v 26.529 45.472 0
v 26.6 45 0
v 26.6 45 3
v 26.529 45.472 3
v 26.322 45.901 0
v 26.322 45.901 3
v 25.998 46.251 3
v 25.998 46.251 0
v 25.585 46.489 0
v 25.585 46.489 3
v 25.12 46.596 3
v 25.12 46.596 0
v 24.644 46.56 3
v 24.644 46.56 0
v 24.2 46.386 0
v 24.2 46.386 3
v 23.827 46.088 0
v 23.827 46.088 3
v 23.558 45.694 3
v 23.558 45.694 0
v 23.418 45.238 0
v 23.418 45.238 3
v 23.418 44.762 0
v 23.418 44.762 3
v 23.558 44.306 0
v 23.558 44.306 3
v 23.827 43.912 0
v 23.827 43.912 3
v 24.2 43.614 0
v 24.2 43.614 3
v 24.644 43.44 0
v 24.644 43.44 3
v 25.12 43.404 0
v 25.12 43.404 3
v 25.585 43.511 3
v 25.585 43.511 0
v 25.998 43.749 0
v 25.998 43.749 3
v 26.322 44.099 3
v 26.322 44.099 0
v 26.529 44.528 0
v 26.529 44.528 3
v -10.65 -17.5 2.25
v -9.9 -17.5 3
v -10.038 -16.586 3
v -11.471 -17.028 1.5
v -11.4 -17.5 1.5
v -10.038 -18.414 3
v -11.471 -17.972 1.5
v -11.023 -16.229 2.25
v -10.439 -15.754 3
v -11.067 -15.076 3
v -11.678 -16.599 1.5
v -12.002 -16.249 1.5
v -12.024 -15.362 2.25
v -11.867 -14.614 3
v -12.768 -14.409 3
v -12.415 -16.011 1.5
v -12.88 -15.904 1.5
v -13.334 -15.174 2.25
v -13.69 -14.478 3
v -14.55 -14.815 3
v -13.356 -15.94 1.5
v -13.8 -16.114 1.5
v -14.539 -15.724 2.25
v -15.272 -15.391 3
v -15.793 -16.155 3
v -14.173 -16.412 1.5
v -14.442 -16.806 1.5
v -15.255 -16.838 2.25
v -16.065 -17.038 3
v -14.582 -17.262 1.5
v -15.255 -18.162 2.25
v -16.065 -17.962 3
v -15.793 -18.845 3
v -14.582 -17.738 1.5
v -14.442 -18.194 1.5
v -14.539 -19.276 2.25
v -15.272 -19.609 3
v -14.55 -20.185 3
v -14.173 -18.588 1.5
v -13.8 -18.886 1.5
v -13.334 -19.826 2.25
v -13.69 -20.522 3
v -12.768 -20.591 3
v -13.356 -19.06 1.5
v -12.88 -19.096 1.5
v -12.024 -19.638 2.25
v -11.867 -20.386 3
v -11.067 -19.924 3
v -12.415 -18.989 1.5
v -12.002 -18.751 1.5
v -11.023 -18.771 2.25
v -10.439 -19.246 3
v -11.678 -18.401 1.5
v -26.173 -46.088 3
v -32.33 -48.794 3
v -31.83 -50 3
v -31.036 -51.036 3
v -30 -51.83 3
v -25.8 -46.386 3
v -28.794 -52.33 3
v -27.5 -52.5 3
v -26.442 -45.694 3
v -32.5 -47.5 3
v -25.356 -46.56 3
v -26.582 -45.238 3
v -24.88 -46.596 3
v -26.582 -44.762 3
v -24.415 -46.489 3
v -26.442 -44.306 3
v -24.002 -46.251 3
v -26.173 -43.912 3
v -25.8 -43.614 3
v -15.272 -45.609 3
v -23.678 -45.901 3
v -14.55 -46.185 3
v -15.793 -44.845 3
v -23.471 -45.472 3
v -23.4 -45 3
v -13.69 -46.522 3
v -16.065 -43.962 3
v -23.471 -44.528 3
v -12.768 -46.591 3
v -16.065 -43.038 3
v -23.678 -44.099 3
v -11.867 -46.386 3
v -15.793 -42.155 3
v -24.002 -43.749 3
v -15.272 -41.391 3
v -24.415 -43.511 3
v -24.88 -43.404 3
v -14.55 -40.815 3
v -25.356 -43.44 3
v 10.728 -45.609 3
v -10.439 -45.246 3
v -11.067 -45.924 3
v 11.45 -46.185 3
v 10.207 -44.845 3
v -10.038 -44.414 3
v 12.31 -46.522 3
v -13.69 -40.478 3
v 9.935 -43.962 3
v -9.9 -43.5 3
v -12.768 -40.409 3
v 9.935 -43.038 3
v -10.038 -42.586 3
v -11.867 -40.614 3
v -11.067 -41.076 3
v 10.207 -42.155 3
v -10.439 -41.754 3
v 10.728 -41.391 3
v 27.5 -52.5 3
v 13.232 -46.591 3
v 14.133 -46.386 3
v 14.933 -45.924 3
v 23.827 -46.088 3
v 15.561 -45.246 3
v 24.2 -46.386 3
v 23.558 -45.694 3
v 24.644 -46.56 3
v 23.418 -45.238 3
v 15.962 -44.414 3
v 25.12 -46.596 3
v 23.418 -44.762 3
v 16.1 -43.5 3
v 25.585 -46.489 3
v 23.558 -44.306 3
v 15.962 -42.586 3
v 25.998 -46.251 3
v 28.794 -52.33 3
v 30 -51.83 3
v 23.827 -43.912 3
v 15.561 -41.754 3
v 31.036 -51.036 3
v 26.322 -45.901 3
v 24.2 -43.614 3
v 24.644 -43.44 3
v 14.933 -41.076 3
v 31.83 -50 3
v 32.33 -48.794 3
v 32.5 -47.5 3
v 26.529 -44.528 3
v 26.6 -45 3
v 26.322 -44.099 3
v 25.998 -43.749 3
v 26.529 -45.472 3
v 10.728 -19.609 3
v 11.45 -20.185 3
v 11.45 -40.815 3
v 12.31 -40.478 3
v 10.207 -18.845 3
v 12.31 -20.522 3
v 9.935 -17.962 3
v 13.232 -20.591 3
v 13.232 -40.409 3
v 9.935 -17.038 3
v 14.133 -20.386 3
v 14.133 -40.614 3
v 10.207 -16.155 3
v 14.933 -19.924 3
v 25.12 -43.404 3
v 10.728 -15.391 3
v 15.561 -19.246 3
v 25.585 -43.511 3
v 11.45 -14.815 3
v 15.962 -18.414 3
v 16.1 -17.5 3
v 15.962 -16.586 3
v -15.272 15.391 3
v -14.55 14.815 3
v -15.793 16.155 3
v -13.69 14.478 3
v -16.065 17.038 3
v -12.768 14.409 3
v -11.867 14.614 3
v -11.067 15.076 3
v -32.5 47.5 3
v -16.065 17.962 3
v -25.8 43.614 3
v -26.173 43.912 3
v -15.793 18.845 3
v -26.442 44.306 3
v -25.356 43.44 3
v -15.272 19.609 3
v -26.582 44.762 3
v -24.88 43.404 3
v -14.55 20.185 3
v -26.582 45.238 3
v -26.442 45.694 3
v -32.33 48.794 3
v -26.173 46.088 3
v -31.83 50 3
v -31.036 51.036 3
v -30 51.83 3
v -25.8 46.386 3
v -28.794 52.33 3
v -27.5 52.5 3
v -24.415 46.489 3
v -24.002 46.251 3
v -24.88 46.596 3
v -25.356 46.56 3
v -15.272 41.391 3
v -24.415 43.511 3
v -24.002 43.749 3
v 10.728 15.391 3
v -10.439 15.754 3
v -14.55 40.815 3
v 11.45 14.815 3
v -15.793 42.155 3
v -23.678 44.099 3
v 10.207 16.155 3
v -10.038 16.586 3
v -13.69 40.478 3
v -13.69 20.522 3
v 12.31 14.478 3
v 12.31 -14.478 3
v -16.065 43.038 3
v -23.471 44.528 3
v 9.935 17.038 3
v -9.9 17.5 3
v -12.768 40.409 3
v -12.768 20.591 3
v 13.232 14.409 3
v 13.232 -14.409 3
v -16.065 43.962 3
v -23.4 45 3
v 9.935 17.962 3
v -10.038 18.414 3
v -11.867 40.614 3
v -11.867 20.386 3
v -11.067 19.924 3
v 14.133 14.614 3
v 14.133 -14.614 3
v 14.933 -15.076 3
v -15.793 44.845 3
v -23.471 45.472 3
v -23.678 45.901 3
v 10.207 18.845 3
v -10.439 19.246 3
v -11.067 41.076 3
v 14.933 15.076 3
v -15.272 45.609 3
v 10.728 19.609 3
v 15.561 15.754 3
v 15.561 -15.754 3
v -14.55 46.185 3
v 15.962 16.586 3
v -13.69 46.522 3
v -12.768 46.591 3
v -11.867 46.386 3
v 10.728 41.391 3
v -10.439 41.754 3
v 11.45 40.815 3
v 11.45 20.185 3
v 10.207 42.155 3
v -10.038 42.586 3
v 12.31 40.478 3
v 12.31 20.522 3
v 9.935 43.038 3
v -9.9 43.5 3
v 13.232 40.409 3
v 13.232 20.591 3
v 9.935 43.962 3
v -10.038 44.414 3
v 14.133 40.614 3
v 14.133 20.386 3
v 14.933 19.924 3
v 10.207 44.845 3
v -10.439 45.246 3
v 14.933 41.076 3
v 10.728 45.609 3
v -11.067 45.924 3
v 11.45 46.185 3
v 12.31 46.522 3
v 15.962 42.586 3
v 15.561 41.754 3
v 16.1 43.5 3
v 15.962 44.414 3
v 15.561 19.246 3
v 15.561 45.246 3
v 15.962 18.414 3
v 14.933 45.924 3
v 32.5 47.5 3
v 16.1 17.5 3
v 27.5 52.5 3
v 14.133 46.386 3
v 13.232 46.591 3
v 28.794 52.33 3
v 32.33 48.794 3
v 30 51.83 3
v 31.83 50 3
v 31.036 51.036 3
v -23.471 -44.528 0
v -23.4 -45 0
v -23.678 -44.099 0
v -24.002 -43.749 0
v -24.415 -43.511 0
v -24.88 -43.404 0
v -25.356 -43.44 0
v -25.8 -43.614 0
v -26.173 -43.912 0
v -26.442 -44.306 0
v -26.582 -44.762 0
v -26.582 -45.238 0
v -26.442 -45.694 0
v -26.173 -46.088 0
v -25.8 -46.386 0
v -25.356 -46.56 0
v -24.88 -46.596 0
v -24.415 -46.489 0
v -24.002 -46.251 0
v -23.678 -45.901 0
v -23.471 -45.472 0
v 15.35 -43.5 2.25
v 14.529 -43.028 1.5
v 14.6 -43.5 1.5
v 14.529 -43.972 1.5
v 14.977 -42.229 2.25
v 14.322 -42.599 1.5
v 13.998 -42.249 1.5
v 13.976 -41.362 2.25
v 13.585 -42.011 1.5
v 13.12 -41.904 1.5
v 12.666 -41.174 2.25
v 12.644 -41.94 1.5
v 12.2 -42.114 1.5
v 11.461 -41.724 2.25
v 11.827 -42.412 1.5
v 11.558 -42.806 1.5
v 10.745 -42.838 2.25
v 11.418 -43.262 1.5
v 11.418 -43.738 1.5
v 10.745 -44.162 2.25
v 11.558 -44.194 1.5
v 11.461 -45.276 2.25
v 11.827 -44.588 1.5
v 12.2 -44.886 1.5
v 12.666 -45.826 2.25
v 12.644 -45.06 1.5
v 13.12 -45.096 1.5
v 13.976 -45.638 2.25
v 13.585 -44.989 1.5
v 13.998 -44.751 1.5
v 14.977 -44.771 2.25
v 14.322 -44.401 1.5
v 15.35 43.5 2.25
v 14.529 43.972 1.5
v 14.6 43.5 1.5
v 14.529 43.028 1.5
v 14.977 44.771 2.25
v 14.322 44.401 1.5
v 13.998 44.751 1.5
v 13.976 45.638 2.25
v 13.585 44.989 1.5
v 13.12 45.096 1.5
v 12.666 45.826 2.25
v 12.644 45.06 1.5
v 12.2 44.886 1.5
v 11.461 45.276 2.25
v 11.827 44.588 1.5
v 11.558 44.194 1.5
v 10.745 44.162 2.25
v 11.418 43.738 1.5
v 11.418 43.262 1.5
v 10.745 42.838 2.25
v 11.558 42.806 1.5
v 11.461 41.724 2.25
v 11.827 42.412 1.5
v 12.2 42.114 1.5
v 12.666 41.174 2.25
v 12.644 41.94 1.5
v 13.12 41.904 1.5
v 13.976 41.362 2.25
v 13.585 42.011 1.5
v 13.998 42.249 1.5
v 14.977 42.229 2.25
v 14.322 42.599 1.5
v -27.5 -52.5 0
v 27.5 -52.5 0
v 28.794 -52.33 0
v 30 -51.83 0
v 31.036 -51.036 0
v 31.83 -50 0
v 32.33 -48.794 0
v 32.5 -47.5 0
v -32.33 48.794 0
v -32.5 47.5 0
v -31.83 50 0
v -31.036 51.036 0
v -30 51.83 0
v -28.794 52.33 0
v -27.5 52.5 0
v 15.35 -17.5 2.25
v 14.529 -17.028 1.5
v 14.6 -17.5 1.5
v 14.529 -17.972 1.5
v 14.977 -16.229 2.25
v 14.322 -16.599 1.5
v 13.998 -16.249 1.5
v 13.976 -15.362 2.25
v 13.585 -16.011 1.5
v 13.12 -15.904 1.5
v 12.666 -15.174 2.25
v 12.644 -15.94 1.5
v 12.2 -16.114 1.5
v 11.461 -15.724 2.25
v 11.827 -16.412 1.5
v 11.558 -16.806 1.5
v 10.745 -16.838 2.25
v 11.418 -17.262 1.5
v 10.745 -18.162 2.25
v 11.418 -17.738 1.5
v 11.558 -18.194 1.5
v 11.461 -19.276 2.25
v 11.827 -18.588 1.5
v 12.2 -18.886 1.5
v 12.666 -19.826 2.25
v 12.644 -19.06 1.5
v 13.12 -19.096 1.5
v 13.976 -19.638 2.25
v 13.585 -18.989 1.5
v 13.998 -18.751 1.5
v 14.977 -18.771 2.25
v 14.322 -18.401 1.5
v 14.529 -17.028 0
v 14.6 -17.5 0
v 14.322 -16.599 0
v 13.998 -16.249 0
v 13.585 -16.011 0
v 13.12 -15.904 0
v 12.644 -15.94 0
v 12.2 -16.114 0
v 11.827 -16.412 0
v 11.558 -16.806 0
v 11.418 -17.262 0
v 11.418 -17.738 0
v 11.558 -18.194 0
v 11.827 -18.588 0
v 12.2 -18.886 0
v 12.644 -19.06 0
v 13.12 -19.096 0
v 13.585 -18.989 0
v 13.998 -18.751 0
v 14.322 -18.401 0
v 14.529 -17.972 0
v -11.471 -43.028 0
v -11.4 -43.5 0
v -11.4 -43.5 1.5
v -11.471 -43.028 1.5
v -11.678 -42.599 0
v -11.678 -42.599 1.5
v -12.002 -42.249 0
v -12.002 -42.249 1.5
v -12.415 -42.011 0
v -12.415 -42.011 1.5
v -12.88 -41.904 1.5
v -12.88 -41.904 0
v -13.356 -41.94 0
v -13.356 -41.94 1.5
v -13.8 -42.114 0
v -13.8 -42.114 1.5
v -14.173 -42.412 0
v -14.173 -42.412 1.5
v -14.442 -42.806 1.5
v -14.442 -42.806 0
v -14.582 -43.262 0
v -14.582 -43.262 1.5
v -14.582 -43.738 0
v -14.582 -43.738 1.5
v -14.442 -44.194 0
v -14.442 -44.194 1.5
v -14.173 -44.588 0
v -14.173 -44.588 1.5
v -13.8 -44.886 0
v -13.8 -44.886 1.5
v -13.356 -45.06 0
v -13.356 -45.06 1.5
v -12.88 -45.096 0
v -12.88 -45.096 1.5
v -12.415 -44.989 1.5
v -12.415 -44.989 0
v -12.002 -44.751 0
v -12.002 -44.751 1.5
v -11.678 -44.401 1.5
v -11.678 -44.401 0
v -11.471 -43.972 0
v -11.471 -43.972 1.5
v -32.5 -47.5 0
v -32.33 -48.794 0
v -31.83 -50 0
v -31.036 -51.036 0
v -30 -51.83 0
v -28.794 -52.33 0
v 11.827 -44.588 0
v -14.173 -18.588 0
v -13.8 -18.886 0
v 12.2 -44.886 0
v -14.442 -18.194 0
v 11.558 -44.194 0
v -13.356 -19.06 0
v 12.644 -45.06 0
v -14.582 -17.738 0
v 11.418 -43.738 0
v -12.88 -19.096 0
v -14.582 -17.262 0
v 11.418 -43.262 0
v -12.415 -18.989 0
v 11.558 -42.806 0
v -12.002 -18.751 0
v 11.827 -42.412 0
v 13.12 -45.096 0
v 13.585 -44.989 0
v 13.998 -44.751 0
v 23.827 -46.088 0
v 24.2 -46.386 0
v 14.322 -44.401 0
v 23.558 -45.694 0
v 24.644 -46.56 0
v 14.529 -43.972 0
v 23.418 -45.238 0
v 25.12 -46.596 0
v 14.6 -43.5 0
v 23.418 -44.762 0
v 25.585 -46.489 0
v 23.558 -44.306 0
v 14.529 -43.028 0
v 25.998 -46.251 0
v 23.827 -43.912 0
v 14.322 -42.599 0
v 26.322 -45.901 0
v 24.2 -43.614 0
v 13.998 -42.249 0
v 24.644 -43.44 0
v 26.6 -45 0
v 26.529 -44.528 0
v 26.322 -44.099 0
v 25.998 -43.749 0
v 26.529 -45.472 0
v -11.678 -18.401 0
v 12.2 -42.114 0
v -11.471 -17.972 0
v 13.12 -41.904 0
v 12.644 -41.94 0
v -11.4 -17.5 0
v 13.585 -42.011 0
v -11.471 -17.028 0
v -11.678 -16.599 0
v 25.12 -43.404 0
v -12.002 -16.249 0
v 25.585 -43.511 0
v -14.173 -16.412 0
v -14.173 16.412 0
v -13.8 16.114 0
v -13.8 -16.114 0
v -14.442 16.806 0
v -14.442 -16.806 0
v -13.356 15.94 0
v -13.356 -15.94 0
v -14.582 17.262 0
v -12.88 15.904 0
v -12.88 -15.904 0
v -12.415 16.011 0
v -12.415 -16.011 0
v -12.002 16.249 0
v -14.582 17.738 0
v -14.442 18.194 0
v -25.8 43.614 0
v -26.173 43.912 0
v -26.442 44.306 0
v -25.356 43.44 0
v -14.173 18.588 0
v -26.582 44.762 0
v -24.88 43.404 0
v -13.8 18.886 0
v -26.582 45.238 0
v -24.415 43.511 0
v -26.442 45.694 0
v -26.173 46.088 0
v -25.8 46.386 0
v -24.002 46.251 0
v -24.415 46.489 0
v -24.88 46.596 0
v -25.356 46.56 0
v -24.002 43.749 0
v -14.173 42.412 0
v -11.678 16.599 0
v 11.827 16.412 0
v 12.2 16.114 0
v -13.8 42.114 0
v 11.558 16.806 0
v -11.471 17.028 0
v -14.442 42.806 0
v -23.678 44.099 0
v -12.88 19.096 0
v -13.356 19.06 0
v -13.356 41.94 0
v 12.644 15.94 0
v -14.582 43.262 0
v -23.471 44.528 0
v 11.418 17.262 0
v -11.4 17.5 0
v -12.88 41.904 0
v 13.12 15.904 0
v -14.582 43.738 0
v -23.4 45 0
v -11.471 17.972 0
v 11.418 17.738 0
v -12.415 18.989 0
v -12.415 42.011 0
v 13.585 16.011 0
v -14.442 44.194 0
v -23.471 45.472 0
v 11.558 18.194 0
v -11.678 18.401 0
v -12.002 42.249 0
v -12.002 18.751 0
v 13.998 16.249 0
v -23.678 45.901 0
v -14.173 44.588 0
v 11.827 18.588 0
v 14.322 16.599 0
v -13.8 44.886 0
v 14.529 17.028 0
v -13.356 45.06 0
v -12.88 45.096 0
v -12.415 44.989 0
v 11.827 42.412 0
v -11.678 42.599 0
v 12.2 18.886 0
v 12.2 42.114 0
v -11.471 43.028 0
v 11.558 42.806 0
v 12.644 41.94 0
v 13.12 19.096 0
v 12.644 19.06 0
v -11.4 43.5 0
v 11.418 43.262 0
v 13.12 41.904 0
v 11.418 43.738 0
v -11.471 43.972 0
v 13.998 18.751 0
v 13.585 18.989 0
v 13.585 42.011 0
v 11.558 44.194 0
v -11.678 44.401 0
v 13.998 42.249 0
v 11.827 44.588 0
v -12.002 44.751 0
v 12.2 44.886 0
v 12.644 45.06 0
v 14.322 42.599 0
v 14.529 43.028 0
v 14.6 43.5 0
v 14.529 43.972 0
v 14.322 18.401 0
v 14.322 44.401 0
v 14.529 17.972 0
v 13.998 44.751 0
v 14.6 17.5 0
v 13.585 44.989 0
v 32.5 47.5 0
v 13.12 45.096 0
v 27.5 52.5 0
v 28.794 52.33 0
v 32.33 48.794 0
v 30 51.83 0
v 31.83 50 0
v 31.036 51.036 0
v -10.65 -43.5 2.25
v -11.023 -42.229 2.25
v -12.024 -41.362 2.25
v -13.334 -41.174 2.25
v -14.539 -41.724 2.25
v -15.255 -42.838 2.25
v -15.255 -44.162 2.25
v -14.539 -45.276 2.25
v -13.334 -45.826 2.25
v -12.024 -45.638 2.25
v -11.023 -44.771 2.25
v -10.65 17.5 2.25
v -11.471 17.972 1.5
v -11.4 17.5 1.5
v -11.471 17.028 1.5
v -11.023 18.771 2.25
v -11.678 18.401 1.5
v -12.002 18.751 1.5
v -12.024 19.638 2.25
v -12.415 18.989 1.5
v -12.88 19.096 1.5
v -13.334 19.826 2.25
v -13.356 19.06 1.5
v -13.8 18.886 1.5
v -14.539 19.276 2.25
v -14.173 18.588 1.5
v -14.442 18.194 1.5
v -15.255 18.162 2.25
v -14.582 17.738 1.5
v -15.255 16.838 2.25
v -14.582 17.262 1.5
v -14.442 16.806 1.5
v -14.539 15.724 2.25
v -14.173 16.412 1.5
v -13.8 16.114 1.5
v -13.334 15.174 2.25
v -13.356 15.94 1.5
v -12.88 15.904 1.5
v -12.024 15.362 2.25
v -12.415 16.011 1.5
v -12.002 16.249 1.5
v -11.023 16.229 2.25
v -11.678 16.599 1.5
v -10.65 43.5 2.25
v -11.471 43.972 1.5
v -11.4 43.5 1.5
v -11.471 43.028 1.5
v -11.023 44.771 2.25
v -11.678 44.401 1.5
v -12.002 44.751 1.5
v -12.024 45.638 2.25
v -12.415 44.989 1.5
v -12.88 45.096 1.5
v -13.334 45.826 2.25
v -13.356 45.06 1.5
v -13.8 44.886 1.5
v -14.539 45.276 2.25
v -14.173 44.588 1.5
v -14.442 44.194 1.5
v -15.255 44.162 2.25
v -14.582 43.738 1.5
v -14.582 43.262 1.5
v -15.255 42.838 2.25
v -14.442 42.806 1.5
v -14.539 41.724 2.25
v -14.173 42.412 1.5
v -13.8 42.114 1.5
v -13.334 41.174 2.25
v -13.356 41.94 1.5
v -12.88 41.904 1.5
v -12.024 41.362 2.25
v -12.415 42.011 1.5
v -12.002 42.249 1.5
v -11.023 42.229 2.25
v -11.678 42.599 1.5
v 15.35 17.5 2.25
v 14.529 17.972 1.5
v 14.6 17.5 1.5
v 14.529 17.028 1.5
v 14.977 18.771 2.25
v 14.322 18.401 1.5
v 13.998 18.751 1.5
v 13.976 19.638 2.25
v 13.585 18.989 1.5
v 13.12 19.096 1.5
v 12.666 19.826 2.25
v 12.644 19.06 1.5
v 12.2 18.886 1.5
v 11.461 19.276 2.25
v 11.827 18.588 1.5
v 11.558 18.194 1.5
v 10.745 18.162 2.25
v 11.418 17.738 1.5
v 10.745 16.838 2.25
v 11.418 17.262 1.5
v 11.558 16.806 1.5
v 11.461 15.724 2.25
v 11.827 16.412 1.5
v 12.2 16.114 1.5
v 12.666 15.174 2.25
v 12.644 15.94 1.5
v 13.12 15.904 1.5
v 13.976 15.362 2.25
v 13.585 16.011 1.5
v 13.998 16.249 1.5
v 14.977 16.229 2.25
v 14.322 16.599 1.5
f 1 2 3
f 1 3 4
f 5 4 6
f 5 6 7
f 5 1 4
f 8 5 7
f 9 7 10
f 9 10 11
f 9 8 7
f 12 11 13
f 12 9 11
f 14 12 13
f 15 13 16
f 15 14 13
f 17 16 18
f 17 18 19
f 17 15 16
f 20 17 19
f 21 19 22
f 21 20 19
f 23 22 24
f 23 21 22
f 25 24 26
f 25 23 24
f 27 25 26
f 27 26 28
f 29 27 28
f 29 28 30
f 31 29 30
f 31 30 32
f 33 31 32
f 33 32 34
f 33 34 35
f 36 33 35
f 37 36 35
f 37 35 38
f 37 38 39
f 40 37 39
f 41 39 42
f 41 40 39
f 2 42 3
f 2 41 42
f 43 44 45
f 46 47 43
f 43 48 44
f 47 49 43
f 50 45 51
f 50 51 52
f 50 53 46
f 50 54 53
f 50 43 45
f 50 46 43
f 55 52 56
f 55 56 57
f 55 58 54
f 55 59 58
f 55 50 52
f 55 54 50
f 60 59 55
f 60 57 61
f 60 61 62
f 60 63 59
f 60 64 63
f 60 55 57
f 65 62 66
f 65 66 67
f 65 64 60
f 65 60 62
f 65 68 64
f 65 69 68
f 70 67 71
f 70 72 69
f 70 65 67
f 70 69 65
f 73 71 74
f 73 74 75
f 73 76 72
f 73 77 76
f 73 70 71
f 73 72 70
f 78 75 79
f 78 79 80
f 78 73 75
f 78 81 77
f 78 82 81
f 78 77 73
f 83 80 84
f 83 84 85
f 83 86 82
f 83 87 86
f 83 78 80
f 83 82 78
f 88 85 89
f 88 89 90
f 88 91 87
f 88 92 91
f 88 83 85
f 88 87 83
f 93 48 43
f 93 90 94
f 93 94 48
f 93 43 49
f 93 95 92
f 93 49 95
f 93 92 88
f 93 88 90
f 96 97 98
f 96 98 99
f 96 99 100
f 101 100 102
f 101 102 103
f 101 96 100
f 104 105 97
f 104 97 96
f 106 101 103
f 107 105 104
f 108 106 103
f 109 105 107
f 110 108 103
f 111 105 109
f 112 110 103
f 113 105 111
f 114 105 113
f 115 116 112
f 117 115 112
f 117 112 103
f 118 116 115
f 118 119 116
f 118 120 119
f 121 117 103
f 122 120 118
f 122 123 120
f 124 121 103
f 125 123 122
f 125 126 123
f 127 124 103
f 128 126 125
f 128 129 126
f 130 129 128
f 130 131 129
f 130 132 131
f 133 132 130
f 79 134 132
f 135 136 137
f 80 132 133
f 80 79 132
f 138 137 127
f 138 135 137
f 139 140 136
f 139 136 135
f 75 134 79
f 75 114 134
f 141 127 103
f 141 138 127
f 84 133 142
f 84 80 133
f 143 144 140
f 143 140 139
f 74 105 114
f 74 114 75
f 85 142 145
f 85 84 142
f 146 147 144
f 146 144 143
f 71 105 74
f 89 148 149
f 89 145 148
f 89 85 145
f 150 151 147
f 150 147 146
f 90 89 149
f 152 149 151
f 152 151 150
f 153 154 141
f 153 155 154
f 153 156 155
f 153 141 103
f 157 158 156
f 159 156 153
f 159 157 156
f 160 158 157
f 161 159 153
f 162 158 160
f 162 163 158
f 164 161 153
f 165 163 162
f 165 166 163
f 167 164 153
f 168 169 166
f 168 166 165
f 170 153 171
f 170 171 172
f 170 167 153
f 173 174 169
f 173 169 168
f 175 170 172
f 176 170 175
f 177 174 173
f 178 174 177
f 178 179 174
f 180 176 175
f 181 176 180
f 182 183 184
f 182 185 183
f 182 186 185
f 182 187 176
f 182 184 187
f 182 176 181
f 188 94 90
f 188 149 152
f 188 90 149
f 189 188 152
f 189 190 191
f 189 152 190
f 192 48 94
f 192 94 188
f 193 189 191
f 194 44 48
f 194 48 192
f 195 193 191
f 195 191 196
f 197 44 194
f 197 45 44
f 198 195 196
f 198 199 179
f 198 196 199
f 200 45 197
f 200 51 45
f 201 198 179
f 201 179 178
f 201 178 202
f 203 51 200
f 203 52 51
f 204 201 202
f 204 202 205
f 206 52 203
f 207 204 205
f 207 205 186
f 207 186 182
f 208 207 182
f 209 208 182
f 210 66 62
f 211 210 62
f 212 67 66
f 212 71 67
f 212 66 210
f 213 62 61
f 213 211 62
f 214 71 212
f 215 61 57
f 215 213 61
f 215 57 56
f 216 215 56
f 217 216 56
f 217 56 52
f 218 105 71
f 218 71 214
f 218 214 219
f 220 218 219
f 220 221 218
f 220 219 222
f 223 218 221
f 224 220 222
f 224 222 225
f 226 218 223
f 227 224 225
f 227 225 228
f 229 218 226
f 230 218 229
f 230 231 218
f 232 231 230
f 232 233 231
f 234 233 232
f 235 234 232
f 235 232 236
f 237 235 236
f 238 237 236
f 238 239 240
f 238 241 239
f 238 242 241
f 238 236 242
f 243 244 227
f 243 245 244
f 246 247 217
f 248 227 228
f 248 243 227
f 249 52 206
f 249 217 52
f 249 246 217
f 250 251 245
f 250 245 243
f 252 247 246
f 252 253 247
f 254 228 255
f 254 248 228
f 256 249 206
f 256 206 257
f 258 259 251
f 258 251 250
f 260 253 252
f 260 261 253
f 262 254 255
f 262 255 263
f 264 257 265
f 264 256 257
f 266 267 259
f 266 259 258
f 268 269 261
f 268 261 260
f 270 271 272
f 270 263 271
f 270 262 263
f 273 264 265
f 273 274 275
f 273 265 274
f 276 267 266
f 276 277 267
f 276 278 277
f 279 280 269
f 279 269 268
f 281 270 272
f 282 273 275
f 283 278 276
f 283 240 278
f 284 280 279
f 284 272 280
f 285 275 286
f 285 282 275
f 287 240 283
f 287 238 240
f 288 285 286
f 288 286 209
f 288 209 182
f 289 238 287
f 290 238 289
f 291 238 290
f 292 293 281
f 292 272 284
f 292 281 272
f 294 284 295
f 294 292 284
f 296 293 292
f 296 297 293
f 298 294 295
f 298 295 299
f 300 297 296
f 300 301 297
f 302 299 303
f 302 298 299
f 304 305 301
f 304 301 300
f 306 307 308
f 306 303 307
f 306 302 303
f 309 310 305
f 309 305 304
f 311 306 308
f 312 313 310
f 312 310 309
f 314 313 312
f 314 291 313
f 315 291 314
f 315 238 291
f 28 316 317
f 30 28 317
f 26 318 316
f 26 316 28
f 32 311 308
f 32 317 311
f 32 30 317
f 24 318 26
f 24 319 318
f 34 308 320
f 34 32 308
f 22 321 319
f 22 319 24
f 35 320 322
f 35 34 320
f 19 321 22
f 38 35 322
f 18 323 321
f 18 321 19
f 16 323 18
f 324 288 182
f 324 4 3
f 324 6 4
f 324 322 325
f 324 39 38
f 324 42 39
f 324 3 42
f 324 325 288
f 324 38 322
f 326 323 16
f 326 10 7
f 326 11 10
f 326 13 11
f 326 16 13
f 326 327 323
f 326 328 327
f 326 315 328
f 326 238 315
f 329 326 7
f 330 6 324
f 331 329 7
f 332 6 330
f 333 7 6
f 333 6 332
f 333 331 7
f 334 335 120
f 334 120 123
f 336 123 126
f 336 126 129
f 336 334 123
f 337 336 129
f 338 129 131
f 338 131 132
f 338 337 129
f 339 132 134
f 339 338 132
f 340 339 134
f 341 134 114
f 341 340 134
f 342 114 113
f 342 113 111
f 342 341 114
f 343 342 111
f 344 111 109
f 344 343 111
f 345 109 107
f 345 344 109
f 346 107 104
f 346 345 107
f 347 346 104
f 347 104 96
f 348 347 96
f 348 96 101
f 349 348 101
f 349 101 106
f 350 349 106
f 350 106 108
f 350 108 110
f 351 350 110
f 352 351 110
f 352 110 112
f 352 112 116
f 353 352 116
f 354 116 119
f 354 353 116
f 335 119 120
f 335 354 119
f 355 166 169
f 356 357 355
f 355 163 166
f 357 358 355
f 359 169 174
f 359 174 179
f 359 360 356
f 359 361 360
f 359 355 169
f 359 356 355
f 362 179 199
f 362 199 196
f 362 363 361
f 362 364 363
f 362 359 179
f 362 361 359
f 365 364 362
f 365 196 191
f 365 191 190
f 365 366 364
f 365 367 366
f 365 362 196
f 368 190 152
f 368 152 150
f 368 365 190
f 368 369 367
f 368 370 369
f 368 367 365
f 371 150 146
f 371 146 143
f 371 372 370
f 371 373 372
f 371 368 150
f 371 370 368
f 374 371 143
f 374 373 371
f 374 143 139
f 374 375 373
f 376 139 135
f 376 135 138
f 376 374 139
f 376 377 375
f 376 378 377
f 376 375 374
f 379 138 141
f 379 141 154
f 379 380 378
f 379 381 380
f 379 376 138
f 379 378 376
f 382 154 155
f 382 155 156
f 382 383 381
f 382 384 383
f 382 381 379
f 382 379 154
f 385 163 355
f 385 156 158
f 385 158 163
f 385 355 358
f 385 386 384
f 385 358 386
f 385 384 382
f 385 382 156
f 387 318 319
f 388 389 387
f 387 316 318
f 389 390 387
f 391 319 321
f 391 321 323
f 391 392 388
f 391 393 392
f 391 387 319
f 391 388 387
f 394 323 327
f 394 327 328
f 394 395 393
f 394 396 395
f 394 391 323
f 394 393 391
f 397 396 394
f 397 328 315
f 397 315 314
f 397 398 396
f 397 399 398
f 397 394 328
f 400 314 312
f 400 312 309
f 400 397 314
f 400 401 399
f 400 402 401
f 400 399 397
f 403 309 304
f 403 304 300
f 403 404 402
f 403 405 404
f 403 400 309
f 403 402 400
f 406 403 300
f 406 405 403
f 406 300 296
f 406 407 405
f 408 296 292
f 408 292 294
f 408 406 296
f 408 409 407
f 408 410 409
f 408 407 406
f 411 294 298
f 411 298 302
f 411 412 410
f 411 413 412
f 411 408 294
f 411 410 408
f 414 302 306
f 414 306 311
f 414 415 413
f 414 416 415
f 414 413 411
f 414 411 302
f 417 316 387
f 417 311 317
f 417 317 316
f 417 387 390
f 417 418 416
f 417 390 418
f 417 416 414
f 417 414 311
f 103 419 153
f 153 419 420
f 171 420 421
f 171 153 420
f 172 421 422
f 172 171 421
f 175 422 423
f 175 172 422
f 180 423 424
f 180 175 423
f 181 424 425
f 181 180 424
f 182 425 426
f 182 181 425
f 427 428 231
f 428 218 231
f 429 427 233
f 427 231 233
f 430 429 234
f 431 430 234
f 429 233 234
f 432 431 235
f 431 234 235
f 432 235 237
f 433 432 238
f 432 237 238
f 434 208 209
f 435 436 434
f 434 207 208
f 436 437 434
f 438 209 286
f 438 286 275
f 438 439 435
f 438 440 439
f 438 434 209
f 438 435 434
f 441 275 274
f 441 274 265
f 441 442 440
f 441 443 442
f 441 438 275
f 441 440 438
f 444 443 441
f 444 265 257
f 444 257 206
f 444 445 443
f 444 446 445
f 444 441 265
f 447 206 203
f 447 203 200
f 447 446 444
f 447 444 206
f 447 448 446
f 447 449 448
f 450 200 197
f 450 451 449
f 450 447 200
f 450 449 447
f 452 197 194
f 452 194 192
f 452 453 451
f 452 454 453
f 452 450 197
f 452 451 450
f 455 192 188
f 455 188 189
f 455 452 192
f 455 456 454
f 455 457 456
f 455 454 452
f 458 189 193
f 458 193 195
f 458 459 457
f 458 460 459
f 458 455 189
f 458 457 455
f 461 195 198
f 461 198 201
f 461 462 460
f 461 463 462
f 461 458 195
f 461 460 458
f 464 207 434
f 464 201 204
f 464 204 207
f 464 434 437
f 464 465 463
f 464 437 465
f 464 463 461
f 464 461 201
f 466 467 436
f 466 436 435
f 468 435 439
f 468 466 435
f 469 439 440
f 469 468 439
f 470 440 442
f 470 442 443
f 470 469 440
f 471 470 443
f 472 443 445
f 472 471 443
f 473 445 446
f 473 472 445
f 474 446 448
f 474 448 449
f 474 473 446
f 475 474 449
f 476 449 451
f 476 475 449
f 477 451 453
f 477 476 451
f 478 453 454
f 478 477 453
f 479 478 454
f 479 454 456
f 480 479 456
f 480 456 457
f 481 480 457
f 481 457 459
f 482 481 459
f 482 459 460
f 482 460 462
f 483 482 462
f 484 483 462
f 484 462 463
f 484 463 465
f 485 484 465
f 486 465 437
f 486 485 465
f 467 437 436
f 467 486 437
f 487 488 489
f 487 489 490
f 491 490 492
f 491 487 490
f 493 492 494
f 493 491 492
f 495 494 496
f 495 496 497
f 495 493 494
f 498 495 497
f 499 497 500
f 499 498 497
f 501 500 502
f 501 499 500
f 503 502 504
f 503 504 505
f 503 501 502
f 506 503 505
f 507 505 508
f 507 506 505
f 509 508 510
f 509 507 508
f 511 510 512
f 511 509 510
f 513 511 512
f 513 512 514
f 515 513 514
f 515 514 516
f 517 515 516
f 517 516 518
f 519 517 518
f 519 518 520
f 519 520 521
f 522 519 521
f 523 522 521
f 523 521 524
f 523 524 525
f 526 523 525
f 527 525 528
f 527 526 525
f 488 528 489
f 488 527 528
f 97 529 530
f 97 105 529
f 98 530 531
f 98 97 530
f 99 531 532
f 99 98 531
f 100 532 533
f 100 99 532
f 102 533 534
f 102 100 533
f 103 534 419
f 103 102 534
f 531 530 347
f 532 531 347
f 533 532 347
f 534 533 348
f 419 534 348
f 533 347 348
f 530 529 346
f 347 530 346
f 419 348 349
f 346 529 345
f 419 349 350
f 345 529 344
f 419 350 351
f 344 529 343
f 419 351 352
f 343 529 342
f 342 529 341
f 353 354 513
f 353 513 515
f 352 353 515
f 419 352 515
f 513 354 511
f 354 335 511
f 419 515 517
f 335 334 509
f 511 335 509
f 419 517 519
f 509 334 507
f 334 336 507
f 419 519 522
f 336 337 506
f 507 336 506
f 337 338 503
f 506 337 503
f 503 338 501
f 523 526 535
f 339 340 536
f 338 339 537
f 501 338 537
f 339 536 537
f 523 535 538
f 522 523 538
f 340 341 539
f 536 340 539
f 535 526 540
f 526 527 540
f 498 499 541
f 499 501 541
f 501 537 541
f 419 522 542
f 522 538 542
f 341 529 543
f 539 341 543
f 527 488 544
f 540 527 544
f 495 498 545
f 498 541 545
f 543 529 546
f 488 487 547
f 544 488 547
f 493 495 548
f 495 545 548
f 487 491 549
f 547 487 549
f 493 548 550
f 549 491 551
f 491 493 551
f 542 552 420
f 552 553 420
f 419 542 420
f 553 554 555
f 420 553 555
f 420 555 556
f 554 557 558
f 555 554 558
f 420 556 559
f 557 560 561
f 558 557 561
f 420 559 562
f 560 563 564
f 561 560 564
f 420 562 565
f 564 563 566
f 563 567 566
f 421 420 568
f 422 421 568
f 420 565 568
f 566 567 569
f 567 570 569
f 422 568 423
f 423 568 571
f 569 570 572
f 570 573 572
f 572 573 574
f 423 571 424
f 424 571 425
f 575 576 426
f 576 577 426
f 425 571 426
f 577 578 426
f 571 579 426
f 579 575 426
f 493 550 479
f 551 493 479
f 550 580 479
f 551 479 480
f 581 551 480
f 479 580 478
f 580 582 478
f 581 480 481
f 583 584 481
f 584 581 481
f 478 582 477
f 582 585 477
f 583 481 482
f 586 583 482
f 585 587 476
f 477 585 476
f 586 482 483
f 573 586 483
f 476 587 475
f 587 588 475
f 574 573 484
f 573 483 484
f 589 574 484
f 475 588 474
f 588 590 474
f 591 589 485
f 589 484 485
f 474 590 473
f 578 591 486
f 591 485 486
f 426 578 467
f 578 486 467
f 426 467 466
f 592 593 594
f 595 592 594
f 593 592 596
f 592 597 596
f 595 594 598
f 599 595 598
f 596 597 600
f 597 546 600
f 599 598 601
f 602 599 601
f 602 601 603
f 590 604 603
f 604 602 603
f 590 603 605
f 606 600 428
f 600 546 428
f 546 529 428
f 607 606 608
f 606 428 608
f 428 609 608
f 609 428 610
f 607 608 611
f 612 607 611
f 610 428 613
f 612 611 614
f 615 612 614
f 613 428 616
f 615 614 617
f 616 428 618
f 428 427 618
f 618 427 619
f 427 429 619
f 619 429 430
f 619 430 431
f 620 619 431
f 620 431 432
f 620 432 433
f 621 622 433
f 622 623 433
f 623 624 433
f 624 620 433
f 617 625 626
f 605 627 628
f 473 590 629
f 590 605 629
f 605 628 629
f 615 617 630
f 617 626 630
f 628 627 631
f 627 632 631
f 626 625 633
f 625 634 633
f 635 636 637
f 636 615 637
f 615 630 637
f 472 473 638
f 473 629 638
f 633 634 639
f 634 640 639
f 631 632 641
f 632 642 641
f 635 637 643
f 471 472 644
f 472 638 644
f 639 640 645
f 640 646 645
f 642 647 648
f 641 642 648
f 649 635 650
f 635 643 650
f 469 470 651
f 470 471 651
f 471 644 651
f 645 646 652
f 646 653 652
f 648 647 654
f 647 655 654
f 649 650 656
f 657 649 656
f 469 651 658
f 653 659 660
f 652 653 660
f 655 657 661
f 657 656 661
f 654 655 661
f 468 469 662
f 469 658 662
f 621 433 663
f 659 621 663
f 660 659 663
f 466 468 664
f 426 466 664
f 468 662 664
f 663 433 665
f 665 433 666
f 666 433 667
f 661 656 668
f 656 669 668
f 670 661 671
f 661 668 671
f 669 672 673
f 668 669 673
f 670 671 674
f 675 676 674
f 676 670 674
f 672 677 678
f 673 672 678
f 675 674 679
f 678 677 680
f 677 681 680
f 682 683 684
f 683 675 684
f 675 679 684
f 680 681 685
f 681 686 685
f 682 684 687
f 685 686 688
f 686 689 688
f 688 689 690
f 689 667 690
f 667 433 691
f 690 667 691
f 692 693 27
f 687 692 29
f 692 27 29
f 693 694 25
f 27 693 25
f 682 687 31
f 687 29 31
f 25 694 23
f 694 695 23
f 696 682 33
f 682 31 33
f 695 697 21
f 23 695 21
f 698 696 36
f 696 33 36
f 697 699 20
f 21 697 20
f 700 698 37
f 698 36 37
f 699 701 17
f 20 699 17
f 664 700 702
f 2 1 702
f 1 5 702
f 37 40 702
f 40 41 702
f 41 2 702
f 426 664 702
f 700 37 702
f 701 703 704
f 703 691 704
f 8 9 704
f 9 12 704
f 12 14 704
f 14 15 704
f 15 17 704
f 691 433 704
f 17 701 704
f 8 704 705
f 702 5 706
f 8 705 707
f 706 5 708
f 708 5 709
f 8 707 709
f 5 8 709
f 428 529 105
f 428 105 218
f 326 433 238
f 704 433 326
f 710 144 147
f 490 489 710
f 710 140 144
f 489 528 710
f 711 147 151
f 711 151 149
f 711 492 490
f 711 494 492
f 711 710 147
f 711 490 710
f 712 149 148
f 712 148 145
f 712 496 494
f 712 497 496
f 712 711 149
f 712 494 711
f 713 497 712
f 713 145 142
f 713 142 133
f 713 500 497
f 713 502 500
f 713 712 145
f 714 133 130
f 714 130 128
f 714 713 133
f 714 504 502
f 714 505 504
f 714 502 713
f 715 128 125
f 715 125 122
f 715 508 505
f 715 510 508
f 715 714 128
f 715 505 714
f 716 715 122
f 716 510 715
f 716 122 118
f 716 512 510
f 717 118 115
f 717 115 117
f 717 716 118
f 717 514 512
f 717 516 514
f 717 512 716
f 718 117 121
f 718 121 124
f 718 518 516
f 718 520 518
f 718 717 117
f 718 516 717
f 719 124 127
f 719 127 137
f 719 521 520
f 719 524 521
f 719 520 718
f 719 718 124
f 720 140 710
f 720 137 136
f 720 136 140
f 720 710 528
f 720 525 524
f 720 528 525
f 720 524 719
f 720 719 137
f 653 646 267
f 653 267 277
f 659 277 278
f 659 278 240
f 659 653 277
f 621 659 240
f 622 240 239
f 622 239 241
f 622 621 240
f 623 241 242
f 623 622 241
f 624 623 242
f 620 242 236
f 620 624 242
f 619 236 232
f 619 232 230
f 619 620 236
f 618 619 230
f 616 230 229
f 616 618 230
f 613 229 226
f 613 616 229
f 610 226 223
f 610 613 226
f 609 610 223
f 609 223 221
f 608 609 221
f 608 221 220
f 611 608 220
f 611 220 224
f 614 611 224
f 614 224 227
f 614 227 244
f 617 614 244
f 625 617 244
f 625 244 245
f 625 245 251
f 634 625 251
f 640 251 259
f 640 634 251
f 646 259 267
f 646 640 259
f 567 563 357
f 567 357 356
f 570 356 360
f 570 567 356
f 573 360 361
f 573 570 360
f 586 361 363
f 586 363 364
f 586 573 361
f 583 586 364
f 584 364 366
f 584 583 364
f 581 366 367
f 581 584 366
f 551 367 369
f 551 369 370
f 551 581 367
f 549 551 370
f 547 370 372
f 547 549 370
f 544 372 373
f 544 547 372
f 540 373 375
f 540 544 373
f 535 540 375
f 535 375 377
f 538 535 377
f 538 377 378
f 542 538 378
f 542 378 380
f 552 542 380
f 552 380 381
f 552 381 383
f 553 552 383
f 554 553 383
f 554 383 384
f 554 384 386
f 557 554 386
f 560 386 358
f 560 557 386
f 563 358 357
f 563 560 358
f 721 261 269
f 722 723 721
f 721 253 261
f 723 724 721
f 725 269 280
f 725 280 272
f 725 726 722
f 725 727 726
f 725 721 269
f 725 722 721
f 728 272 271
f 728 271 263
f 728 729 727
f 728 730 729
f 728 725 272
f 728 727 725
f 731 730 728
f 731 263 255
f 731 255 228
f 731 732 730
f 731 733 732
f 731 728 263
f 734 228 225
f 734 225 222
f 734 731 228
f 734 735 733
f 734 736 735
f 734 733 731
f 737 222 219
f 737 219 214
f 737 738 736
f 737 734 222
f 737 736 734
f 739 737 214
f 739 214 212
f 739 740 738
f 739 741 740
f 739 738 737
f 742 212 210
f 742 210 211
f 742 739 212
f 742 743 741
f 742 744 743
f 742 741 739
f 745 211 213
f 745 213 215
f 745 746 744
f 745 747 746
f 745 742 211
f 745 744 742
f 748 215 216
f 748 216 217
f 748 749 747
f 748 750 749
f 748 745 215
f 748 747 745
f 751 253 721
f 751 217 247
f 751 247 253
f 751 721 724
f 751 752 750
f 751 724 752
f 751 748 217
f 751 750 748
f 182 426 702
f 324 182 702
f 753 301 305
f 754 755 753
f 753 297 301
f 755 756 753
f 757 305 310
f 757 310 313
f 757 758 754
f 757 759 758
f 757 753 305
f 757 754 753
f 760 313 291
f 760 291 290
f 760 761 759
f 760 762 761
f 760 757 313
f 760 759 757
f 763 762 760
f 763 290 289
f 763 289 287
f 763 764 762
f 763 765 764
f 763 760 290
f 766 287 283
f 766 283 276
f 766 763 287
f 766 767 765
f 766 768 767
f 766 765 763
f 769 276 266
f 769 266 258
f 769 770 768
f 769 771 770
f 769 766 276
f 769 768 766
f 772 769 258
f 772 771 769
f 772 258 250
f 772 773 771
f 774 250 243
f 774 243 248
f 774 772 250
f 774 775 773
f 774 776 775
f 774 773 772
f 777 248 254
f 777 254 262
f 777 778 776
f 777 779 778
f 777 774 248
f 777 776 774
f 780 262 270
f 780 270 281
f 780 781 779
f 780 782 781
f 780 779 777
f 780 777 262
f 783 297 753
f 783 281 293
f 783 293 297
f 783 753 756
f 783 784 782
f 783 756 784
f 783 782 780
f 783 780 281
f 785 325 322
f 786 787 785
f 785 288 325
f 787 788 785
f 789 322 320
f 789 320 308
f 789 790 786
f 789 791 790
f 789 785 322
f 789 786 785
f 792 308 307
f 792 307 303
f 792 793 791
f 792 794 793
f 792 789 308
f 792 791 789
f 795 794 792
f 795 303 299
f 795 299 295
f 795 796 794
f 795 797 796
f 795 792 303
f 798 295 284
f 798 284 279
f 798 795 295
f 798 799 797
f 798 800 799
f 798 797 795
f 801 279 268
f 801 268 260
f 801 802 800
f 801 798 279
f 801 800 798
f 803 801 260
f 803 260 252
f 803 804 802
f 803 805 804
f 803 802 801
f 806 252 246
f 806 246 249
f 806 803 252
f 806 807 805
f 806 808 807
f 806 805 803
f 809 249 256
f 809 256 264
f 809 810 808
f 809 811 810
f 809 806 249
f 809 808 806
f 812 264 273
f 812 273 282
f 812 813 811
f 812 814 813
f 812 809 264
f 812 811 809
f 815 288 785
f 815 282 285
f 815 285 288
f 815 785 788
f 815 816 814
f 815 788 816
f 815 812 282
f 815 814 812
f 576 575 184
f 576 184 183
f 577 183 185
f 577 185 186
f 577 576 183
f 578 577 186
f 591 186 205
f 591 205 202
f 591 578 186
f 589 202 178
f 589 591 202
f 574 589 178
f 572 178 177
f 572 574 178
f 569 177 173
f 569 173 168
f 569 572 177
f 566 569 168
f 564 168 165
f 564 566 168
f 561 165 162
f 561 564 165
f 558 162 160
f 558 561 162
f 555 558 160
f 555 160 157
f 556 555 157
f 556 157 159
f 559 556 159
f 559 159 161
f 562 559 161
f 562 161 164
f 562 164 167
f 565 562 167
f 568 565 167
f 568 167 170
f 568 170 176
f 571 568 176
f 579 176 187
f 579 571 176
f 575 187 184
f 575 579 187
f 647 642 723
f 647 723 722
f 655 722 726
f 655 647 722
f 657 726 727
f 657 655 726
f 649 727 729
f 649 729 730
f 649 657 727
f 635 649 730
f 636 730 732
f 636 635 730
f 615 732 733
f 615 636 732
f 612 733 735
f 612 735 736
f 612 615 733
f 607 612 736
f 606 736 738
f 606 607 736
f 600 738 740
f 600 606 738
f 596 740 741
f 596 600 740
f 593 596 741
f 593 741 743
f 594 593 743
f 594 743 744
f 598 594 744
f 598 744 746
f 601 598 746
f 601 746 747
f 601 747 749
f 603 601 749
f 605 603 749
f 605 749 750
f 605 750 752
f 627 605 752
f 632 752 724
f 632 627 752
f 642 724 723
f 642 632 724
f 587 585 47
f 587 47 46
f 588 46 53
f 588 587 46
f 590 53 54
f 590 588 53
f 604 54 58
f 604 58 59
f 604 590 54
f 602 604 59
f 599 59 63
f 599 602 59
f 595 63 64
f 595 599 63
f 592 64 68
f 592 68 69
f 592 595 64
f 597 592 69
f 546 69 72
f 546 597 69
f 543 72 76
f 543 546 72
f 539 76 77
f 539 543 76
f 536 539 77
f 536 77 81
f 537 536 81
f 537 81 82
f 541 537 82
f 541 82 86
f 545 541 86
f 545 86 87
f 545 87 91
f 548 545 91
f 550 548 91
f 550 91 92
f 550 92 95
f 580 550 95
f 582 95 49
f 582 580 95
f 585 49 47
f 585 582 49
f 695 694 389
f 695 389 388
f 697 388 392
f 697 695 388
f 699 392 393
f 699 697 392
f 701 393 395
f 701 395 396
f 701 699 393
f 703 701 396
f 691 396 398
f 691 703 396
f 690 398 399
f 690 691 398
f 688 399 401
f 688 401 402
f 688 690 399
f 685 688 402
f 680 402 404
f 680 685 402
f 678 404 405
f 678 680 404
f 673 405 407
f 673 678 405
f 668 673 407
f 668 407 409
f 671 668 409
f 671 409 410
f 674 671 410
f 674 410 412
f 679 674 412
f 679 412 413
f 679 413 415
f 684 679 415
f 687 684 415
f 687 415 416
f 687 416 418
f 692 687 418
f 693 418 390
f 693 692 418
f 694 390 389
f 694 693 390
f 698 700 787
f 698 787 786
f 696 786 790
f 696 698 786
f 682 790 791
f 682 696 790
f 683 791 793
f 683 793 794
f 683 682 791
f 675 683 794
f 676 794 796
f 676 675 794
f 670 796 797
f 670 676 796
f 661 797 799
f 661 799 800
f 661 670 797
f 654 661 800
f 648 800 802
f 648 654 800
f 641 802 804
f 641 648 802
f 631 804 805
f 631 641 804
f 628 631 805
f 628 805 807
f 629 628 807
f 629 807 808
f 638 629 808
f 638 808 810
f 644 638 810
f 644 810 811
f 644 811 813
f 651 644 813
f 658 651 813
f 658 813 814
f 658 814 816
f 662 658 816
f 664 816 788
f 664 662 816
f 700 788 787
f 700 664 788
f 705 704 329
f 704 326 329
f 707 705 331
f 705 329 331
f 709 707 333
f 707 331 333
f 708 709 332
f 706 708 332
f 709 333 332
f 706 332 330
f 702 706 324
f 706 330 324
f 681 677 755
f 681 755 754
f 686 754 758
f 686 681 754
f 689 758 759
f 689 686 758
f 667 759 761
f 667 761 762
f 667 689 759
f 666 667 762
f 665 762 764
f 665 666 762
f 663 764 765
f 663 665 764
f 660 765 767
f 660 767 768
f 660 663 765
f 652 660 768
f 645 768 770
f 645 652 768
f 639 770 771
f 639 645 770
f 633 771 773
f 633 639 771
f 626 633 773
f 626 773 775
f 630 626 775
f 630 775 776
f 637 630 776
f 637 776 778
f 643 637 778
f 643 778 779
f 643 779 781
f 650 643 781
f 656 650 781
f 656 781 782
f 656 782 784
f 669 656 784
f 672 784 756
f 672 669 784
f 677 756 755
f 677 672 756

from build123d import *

# Parameters (mm, degrees)
SKETCH_2_W      = 65
SKETCH_2_H      = 105
SKETCH_2_R      = 1.6
EXTRUDE_1_DEPTH = 3
FILLET_1_R      = 5
CHAMFER_1_SIZE  = 1.5


with BuildPart() as part:
    # ｽｹｯﾁ2 → ﾎﾞｽ - 押し出し1 (new body)
    with BuildSketch(Plane.XY):
        Rectangle(SKETCH_2_W, SKETCH_2_H)
        with Locations((-13, 43.5)):
            Circle(SKETCH_2_R, mode=Mode.SUBTRACT)
        with Locations((13, 17.5)):
            Circle(SKETCH_2_R, mode=Mode.SUBTRACT)
        with Locations((13, 43.5)):
            Circle(SKETCH_2_R, mode=Mode.SUBTRACT)
        with Locations((-13, 17.5)):
            Circle(SKETCH_2_R, mode=Mode.SUBTRACT)
        with Locations((-13, -17.5)):
            Circle(SKETCH_2_R, mode=Mode.SUBTRACT)
        with Locations((13, -17.5)):
            Circle(SKETCH_2_R, mode=Mode.SUBTRACT)
        with Locations((-13, -43.5)):
            Circle(SKETCH_2_R, mode=Mode.SUBTRACT)
        with Locations((13, -43.5)):
            Circle(SKETCH_2_R, mode=Mode.SUBTRACT)
        with Locations((-25, 45)):
            Circle(SKETCH_2_R, mode=Mode.SUBTRACT)
        with Locations((25, 45)):
            Circle(SKETCH_2_R, mode=Mode.SUBTRACT)
        with Locations((25, -45)):
            Circle(SKETCH_2_R, mode=Mode.SUBTRACT)
        with Locations((-25, -45)):
            Circle(SKETCH_2_R, mode=Mode.SUBTRACT)
    extrude(amount=EXTRUDE_1_DEPTH)

    # ﾌｨﾚｯﾄ1
    fillet_1_edges = [part.edges().sort_by_distance(p)[0] for p in [
        (32.5, -52.5, 1.5),
        (-32.5, -52.5, 1.5),
        (-32.5, 52.5, 1.5),
        (32.5, 52.5, 1.5),
    ]]
    fillet(fillet_1_edges, radius=FILLET_1_R)

    # 面取り1
    chamfer_1_edges = [part.edges().sort_by_distance(p)[0] for p in [
        (11.4, 17.5, 3),
        (-14.6, 43.5, 3),
        (11.4, 43.5, 3),
        (-14.6, 17.5, 3),
        (-14.6, -17.5, 3),
        (11.4, -17.5, 3),
        (-14.6, -43.5, 3),
        (11.4, -43.5, 3),
    ]]
    chamfer(chamfer_1_edges, length=CHAMFER_1_SIZE)


solid = part.part
